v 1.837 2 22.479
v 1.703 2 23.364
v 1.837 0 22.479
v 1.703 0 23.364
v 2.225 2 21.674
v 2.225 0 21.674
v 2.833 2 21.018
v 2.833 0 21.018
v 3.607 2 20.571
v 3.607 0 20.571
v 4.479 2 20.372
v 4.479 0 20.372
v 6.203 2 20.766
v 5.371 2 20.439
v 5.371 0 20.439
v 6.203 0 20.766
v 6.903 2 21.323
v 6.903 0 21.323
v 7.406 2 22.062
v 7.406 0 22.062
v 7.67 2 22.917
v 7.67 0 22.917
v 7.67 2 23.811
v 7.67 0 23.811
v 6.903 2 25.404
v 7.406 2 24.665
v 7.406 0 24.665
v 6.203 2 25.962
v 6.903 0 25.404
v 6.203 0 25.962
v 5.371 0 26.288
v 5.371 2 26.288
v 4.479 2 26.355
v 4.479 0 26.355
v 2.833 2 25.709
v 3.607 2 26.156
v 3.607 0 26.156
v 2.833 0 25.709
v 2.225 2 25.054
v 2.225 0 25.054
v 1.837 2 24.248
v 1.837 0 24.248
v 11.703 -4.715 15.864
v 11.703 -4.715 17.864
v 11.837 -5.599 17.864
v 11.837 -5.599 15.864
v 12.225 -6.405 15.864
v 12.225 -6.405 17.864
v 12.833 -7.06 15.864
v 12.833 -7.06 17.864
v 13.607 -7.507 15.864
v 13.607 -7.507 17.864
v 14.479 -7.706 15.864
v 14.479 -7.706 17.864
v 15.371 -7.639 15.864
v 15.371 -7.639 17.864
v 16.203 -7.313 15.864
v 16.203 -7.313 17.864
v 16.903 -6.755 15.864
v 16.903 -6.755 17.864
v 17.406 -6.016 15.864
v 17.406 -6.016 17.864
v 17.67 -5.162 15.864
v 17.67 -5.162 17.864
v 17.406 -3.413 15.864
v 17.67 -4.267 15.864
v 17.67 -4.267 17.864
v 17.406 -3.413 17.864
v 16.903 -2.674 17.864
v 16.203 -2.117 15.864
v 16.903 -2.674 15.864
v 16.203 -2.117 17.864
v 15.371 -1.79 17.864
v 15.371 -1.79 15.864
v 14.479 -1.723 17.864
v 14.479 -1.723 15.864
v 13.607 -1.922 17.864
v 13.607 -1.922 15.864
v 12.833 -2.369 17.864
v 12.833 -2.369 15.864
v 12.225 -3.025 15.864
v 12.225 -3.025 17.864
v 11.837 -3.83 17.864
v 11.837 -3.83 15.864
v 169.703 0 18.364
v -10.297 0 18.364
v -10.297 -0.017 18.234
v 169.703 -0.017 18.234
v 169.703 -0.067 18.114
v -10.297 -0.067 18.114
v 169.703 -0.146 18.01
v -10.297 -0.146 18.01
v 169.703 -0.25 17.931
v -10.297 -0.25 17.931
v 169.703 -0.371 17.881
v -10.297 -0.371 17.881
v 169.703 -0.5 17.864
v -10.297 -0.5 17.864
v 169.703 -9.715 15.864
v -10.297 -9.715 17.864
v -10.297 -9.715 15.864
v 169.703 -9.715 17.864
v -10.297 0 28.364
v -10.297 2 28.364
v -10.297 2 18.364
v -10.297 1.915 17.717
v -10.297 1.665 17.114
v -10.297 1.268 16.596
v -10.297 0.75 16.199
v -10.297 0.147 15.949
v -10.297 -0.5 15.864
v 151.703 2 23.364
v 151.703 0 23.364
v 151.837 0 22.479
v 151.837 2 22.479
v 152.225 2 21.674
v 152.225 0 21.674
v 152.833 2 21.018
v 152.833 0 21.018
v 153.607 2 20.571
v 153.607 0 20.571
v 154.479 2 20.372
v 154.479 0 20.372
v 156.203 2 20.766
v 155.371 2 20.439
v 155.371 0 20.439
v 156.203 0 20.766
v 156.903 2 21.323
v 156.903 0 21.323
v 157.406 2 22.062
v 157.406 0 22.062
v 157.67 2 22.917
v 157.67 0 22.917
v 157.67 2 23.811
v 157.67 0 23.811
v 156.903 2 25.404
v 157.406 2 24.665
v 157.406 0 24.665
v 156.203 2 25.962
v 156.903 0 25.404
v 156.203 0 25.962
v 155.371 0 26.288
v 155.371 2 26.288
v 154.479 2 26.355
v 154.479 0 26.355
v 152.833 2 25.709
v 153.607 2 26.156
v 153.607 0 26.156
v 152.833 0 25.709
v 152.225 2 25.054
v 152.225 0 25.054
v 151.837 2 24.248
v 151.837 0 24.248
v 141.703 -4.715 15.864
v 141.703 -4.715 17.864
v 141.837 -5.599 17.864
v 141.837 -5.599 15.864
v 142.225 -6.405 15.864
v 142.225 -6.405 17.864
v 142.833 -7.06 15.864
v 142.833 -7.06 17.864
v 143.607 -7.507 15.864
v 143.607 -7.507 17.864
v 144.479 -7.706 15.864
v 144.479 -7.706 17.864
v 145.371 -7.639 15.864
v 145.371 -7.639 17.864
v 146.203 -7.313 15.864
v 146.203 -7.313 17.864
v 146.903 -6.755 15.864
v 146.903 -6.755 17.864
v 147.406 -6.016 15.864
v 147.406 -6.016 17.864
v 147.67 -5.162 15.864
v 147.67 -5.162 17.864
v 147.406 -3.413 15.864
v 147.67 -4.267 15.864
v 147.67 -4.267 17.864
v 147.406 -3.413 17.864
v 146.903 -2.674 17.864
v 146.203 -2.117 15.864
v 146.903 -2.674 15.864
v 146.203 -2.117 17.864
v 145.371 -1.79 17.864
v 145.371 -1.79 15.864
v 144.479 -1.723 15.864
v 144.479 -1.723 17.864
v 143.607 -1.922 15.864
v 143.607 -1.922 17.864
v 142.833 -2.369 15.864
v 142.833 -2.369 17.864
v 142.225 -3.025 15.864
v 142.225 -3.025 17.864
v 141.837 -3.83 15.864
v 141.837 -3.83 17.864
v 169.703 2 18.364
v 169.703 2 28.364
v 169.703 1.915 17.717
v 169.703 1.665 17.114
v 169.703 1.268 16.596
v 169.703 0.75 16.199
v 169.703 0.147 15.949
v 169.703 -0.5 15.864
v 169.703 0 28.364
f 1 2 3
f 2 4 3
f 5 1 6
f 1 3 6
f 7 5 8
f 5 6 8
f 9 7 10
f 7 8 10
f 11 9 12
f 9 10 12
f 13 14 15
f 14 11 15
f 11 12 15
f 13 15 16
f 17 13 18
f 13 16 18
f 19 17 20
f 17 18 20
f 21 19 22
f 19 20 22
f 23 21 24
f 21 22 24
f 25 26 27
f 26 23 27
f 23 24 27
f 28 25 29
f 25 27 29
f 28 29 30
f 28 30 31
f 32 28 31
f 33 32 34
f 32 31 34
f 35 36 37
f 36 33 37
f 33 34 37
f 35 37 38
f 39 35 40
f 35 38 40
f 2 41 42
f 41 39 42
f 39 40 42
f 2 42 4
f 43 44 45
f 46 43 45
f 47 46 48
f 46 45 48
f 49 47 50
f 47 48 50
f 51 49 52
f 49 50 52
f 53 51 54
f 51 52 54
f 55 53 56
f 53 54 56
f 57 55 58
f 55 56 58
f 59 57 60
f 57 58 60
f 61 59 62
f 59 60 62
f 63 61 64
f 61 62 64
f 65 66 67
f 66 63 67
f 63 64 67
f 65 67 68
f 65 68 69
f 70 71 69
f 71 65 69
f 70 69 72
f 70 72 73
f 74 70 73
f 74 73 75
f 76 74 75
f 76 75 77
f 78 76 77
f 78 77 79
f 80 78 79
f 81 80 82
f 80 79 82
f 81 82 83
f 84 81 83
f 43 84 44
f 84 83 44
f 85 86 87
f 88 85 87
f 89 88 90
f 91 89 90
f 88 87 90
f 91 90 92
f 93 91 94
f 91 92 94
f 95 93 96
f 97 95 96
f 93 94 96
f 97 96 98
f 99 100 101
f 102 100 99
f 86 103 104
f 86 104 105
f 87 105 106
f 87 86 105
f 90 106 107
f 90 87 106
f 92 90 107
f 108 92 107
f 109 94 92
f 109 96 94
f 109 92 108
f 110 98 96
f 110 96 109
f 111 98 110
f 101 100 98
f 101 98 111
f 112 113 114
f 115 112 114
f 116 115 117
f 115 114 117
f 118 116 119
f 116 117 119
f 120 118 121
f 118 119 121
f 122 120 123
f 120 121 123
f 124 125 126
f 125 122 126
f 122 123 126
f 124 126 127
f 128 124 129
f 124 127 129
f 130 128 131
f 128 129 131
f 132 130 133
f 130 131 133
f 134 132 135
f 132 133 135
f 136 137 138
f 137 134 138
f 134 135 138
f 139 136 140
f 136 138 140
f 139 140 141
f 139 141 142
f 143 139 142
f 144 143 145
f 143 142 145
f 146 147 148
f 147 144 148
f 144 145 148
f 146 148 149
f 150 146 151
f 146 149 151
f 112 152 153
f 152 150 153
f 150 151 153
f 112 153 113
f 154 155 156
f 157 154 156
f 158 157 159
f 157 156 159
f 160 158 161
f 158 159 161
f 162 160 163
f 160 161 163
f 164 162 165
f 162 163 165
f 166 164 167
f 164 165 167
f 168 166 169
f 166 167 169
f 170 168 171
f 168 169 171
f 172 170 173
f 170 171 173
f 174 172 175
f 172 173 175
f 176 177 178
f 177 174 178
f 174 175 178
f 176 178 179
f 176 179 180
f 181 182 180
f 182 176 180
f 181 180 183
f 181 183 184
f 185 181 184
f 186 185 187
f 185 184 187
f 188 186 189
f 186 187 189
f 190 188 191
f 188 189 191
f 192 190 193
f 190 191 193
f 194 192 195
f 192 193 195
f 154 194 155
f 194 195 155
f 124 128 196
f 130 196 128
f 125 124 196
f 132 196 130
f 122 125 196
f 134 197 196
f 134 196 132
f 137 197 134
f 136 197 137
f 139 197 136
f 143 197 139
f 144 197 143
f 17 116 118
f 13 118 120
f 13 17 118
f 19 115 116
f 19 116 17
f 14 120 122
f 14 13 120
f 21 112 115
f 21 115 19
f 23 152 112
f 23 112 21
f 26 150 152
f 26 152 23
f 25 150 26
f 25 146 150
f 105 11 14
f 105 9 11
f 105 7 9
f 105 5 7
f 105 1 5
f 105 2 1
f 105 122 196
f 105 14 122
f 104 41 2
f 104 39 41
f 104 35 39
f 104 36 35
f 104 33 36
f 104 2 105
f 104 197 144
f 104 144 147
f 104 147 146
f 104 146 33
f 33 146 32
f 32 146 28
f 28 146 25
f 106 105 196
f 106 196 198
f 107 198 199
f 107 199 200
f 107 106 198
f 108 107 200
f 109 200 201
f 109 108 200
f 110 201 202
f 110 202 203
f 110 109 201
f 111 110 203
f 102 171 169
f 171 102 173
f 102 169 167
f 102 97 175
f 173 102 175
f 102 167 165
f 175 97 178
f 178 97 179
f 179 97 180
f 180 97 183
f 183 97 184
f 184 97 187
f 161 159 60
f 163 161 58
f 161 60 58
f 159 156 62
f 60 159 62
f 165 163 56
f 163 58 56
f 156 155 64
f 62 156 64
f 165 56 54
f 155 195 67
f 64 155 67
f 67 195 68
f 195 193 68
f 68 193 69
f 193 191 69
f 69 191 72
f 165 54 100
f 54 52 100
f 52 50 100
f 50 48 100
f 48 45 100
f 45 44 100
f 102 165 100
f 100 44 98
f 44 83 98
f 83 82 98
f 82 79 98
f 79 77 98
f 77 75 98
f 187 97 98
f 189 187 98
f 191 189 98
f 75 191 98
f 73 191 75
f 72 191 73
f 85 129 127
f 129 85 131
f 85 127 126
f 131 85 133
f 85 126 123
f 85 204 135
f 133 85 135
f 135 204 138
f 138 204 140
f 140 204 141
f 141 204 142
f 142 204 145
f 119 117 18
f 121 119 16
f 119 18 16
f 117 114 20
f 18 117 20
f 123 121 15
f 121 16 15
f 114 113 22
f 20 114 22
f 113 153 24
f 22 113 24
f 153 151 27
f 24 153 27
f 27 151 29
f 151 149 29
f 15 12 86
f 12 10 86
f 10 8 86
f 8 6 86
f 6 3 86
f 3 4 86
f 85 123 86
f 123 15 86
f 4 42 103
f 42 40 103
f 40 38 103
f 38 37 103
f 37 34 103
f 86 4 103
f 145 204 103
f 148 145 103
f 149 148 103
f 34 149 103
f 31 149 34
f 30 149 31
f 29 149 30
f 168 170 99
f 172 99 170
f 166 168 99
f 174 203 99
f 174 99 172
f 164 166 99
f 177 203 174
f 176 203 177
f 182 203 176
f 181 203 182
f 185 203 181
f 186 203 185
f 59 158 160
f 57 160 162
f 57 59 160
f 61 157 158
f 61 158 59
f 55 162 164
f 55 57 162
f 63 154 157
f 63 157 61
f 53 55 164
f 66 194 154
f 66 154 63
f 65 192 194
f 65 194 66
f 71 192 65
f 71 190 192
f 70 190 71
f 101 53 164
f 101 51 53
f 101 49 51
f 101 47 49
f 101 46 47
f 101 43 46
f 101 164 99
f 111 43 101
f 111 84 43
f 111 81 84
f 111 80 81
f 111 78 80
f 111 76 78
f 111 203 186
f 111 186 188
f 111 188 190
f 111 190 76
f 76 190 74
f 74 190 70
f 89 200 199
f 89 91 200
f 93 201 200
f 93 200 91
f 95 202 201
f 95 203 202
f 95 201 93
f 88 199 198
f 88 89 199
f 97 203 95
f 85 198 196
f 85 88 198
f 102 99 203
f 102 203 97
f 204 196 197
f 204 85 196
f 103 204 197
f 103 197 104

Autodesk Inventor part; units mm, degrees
ref_plane "YZ Plane" through (0, 0, 0) normal (1, 0, 0) x (0, 1, 0)
ref_plane "XZ Plane" through (0, 0, 0) normal (0, 1, 0) x (-1, 0, 0)
ref_plane "XY Plane" through (0, 0, 0) normal (0, 0, 1) x (1, 0, 0)
sketch "Boceto5" plane through (0, 0, 0) normal (0, 1, 0) x (-1, 0, 0)
  line L0 (10.2966, 28.3637) -> (10.2966, 8.3637)
  line L1 (10.2966, 8.3637) -> (-169.7034, 8.3637)
  line L2 (-169.7034, 8.3637) -> (-169.7034, 28.3637)
  line L3 (-169.7034, 28.3637) -> (10.2966, 28.3637)
  line L4 (10.2966, 18.3637) -> (-169.7034, 18.3637)
  circle A0 centre (-154.7034, 23.3637) radius 3
  circle A1 centre (-4.7034, 23.3637) radius 3
  circle A2 centre (-14.7034, 13.3637) radius 3
  circle A3 centre (-144.7034, 13.3637) radius 3
  point P0 (0, 0)
  dimension "d33" = 20
  dimension "d34" = 180
  dimension "d35" = 20
  dimension "d36" = 6
  dimension "d37" = 6
  dimension "d38" = 6
  dimension "d39" = 6
  dimension "d40" = 150
  dimension "d41" = 130
  dimension "d42" = 15
  dimension "d43" = 25
  dimension "d44" = 5
  dimension "d45" = 5
  dimension "d46" = 5
  dimension "d47" = 5
extrude "Extrusión4" add sketch "Boceto5" along normal blind 2 contours L0 L1 L2 L4
extrude "Extrusión5" add sketch "Boceto5" along normal blind 2 contours L0 L4 L2 L3
bend part "Pieza de plegado1" radius 0.5 angle 90 line through (-10.2966, 0, 18.3637) along (1, 0, 0) centre toward (0, -1, 0) moving side (0, 0, -1) both sides no
equation "\"Radio_pliegue\" = Grosor"
equation "\"Anchura_desahogo_plegado\" = Grosor"
equation "\"Profundidad_desahogo_plegado\" = 0.5 * Grosor"
equation "\"Tamaño_destalonado\" = 4 * Grosor"
equation "\"Remanente_mínimo\" = 2 * Grosor"
equation "\"Radiodetransición\" = Radio_pliegue"
equation "\"Tamaño_de_radio_de_Jacobi\" = Grosor"
equation "\"TamañoSeparación\" = Grosor"
equation "\"Grosor\" = 0.5"
properties part number "Soporte L" material "Aluminum 1100-H14"
